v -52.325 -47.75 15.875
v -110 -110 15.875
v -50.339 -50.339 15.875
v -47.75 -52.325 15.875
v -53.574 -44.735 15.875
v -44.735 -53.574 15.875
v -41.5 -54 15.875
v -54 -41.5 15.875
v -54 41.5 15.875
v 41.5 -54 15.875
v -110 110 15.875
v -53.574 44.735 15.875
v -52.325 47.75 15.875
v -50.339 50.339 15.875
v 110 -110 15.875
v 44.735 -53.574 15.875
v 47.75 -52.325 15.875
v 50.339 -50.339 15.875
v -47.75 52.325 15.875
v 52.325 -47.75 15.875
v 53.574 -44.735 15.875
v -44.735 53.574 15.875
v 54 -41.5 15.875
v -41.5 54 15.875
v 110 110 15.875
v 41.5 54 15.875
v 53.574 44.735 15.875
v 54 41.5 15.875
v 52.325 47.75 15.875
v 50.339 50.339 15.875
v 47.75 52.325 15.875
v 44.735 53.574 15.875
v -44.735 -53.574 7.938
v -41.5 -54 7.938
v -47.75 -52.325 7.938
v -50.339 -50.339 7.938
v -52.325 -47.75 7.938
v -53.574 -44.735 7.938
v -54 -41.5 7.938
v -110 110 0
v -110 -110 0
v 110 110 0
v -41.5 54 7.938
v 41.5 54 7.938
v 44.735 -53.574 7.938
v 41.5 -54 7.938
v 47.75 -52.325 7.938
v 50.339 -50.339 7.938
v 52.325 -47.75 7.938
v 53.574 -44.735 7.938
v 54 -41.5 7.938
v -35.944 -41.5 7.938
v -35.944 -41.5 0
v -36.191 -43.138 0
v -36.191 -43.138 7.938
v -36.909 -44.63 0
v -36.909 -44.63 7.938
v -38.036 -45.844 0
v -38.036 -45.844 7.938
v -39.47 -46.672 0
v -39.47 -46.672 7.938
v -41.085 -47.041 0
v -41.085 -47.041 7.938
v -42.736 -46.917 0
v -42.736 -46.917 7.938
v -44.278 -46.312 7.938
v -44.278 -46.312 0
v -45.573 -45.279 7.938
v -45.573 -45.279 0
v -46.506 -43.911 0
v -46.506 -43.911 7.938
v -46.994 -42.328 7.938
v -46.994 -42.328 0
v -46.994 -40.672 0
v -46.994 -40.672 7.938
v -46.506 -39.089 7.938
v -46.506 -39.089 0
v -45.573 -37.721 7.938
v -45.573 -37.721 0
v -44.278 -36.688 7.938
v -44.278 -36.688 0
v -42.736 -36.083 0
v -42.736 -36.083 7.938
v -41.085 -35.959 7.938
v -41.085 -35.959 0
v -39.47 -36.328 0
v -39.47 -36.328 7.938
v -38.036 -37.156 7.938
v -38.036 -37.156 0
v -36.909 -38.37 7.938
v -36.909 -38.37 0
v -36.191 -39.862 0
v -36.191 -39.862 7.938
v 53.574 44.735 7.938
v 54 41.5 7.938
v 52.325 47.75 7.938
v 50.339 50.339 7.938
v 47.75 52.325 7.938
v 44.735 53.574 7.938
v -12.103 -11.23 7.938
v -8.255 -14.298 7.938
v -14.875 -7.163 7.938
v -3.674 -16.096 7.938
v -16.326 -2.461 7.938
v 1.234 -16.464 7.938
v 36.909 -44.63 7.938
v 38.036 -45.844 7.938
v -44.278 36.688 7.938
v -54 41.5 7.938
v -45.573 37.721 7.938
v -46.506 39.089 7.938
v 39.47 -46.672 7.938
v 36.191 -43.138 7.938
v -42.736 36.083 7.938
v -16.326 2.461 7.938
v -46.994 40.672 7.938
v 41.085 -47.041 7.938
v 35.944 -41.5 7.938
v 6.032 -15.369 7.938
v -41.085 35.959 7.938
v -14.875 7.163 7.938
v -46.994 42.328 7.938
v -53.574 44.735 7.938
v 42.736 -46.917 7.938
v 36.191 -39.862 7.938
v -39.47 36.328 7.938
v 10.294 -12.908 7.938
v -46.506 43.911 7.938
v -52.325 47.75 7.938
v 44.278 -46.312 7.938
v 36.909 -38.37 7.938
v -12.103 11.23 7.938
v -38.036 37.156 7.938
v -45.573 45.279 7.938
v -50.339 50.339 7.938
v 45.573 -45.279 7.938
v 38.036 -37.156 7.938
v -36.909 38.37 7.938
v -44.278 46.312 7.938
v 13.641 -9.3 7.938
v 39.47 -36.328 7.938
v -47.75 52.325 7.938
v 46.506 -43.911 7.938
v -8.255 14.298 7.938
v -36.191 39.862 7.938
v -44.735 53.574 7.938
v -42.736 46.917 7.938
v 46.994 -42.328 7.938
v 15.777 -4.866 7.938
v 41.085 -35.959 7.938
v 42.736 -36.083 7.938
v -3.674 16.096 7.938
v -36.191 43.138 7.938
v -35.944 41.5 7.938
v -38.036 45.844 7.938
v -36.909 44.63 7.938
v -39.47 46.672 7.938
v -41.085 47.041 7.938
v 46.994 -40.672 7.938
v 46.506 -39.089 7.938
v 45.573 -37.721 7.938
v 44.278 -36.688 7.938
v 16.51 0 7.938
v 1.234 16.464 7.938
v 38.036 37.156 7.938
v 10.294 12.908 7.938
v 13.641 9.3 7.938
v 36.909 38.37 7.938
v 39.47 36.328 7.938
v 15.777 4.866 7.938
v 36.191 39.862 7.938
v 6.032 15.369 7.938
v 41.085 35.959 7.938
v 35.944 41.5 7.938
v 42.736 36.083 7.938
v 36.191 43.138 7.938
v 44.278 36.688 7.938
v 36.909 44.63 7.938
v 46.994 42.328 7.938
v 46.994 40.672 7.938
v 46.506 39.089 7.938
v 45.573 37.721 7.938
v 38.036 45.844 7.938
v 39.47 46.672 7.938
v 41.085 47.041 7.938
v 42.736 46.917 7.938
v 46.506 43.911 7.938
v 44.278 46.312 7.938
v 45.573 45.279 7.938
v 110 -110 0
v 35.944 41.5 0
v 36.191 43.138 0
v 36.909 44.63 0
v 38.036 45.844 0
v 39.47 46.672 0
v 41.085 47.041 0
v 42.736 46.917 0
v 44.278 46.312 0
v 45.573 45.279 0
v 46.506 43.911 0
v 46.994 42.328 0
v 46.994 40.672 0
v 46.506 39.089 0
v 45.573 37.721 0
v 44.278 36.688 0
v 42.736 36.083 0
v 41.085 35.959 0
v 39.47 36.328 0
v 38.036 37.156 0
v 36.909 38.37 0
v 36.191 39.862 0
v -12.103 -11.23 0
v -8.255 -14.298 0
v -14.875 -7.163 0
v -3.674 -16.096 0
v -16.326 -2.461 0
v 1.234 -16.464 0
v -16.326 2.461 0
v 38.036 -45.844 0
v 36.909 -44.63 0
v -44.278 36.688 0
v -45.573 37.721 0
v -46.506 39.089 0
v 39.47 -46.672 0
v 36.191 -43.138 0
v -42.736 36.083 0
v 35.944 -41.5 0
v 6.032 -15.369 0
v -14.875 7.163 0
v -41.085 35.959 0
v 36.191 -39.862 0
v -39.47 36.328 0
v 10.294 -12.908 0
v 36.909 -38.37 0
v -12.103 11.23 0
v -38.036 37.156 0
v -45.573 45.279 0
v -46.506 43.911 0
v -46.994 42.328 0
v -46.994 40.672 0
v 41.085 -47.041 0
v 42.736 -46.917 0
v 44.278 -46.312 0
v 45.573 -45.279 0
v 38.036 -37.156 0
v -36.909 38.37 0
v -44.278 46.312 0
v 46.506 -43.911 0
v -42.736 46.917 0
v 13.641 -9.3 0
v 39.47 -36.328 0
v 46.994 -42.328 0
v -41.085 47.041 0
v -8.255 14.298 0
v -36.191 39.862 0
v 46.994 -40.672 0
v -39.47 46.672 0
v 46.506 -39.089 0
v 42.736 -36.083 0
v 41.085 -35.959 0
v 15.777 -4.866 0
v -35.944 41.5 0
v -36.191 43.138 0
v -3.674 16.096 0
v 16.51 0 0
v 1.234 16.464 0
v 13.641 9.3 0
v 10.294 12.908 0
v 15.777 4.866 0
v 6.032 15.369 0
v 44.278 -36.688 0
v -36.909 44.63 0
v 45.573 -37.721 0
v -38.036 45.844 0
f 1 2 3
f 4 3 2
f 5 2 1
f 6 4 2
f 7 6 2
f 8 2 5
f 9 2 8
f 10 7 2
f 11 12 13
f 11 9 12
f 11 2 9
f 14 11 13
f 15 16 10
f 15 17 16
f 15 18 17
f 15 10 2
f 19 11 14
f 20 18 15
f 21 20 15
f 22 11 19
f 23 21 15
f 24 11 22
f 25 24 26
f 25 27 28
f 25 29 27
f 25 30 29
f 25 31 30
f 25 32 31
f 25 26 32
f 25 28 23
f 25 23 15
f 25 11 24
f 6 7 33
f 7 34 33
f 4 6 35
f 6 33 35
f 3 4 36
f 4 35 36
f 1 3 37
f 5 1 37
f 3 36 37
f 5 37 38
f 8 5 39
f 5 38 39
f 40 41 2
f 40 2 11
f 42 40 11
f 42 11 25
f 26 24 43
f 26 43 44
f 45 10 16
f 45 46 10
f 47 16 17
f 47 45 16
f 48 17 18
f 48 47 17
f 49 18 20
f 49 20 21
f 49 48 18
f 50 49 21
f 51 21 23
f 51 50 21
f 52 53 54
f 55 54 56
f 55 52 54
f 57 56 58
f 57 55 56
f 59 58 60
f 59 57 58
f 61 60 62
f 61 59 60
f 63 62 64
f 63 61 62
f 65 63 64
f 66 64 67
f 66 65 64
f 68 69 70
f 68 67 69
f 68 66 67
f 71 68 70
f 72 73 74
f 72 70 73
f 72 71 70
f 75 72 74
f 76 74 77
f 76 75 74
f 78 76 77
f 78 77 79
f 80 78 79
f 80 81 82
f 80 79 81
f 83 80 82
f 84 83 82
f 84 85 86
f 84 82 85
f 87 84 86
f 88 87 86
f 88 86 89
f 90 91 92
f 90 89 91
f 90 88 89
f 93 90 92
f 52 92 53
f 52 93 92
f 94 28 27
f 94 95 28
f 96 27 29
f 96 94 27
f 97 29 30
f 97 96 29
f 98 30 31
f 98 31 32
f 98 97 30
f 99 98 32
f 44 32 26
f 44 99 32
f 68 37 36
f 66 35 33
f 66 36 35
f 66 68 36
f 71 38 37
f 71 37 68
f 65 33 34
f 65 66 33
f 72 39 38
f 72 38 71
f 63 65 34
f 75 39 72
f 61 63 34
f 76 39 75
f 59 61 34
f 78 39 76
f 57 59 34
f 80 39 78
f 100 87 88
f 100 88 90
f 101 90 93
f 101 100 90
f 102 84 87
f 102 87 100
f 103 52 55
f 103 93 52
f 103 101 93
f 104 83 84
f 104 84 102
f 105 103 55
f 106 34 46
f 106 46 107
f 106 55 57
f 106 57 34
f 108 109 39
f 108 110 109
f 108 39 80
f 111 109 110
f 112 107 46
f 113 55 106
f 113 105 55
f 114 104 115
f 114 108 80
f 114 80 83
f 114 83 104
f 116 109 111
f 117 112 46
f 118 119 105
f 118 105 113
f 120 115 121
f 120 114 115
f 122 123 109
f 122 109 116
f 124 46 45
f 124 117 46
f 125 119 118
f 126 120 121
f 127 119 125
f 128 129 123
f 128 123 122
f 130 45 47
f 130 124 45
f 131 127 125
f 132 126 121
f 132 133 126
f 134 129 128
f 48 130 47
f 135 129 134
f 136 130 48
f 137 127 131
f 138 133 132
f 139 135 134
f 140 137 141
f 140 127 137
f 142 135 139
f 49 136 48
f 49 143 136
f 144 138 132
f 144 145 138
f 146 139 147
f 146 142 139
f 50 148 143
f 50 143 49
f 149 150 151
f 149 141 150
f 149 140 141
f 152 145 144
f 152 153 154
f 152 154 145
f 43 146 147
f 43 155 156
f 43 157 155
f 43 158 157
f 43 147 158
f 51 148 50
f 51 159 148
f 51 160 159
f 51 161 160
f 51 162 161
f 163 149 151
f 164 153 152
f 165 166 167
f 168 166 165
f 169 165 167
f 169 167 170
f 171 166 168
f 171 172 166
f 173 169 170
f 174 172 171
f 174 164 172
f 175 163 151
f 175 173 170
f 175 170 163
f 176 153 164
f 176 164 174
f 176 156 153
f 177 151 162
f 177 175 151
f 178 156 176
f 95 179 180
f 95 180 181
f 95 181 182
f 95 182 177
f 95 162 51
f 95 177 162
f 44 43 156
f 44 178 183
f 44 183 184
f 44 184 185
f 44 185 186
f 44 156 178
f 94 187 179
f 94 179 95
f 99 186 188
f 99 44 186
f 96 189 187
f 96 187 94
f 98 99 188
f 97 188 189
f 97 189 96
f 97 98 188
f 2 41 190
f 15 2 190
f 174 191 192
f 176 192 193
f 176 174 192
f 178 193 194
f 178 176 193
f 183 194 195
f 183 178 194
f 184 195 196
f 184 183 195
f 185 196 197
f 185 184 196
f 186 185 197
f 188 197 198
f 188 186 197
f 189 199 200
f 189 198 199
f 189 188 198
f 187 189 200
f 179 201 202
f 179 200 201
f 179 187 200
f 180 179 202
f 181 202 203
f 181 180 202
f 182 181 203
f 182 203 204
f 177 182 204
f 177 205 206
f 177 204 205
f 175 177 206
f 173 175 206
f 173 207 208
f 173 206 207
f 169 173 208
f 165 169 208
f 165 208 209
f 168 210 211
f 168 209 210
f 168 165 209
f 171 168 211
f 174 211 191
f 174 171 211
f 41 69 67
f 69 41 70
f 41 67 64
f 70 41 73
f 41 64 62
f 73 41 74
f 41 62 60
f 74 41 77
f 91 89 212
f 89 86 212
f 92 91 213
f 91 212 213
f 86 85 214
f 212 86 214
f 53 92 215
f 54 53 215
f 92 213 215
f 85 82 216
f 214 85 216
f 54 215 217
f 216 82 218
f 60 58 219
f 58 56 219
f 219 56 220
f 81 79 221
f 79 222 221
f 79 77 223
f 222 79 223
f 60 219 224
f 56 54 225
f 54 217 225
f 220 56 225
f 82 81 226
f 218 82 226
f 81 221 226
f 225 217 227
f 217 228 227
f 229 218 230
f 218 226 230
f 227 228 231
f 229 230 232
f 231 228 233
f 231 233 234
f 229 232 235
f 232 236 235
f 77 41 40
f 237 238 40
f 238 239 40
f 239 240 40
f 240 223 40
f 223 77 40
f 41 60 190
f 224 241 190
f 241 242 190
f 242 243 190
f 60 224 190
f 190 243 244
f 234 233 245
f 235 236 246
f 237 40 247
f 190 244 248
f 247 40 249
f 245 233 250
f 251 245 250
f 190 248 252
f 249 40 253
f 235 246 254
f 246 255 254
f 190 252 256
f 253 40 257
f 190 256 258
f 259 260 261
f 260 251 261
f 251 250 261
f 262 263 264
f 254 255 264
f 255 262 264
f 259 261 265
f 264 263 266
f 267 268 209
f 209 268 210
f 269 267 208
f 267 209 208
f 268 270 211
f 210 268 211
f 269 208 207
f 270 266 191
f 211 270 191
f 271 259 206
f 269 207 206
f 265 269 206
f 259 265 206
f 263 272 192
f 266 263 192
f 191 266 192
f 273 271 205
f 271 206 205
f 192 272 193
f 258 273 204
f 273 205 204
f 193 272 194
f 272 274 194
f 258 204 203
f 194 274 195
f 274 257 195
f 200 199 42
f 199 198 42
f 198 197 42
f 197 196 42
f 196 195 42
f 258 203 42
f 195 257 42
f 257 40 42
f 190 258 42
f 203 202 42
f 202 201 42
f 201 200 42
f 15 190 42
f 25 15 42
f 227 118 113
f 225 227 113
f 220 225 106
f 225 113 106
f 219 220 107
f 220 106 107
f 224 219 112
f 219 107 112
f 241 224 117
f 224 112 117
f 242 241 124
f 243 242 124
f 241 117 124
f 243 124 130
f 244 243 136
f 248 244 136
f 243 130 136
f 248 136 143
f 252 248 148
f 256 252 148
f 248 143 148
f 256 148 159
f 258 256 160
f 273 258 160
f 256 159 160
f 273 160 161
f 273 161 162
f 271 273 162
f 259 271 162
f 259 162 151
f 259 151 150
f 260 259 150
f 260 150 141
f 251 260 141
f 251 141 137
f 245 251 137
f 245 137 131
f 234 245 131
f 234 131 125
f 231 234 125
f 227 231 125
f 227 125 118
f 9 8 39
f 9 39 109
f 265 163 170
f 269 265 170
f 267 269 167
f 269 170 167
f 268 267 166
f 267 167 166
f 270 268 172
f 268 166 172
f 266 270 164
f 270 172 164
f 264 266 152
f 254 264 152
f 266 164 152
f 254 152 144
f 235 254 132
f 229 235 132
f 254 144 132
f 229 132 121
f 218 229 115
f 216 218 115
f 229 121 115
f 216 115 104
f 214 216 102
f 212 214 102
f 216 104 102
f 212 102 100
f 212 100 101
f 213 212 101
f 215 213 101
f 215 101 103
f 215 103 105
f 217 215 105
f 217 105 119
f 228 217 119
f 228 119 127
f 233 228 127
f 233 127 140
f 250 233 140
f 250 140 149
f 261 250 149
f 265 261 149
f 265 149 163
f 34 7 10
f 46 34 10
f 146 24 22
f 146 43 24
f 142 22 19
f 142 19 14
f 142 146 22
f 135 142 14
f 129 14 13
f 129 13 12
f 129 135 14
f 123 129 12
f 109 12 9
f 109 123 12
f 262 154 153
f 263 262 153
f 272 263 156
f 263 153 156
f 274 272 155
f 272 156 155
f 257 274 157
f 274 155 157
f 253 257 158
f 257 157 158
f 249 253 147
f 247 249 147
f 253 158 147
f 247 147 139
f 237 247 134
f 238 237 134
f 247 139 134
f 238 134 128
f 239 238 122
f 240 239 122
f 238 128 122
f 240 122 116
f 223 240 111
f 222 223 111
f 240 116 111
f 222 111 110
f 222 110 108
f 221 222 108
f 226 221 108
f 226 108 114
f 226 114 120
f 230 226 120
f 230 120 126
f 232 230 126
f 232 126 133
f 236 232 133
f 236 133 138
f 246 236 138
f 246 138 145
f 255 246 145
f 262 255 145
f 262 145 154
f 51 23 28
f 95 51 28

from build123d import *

# Parameters (mm, degrees)
SKETCH2_W                                  = 220
SKETCH2_H                                  = 220
BOSS_EXTRUDE1_DEPTH                        = 15.875
SKETCH4_W                                  = 108
SKETCH4_H                                  = 108
CUT_EXTRUDE1_DEPTH                         = 7.9375
FILLET1_R                                  = 12.5
SKETCH5_R                                  = 5.55625
CUT_EXTRUDE2_DEPTH                         = 156.765862455
MIRROR1_AT_THE_SECOND_PLANE_COPY_1_SKETC_R = 5.55625
MIRROR1_AT_THE_SECOND_PLANE_COPY_1_DEPTH   = 156.765862455
SKETCH6_R                                  = 16.51
CUT_EXTRUDE3_DEPTH                         = 156.765862455


with BuildPart() as part:
    # Sketch2 → Boss-Extrude1 (new body)
    with BuildSketch(Plane.XY):
        Rectangle(SKETCH2_W, SKETCH2_H)
    extrude(amount=BOSS_EXTRUDE1_DEPTH)

    # Sketch4 → Cut-Extrude1 (cut)
    with BuildSketch(Plane.XY.offset(15.875)):
        Rectangle(SKETCH4_W, SKETCH4_H)
    extrude(amount=-CUT_EXTRUDE1_DEPTH, mode=Mode.SUBTRACT)

    # Fillet1
    fillet1_edges = [part.edges().sort_by_distance(p)[0] for p in [
        (-54, -54, 11.90625),
        (-54, 54, 11.90625),
        (54, 54, 11.90625),
        (54, -54, 11.90625),
    ]]
    fillet(fillet1_edges, radius=FILLET1_R)

    # Sketch5 → Cut-Extrude2 (cut, through all)
    with BuildSketch(Plane.XY.offset(7.9375)):
        with Locations((-41.5, 41.5)):
            Circle(SKETCH5_R)
    cut_extrude2 = extrude(amount=-CUT_EXTRUDE2_DEPTH, mode=Mode.SUBTRACT)

    # Mirror1: Cut-Extrude2 across plane
    add(cut_extrude2.mirror(Plane.ZX), mode=Mode.SUBTRACT)

    # Mirror1 at the second plane: Cut-Extrude2 across plane
    add(cut_extrude2.mirror(Plane(origin=(0, 0, 0), x_dir=(0, 0, 1), z_dir=(1, 0, 0))), mode=Mode.SUBTRACT)

    # Mirror1 at the second plane copy 1 sketc → Mirror1 at the second plane copy 1 (cut, through all)
    with BuildSketch(Plane(origin=(0, 0, 7.9375), x_dir=(-1, 0, 0), z_dir=(0, 0, 1))):
        with Locations((-41.5, 41.5)):
            Circle(MIRROR1_AT_THE_SECOND_PLANE_COPY_1_SKETC_R)
    extrude(amount=-MIRROR1_AT_THE_SECOND_PLANE_COPY_1_DEPTH, mode=Mode.SUBTRACT)

    # Sketch6 → Cut-Extrude3 (cut, through all)
    with BuildSketch(Plane.XY.offset(7.9375)):
        Circle(SKETCH6_R)
    extrude(amount=-CUT_EXTRUDE3_DEPTH, mode=Mode.SUBTRACT)


solid = part.part
